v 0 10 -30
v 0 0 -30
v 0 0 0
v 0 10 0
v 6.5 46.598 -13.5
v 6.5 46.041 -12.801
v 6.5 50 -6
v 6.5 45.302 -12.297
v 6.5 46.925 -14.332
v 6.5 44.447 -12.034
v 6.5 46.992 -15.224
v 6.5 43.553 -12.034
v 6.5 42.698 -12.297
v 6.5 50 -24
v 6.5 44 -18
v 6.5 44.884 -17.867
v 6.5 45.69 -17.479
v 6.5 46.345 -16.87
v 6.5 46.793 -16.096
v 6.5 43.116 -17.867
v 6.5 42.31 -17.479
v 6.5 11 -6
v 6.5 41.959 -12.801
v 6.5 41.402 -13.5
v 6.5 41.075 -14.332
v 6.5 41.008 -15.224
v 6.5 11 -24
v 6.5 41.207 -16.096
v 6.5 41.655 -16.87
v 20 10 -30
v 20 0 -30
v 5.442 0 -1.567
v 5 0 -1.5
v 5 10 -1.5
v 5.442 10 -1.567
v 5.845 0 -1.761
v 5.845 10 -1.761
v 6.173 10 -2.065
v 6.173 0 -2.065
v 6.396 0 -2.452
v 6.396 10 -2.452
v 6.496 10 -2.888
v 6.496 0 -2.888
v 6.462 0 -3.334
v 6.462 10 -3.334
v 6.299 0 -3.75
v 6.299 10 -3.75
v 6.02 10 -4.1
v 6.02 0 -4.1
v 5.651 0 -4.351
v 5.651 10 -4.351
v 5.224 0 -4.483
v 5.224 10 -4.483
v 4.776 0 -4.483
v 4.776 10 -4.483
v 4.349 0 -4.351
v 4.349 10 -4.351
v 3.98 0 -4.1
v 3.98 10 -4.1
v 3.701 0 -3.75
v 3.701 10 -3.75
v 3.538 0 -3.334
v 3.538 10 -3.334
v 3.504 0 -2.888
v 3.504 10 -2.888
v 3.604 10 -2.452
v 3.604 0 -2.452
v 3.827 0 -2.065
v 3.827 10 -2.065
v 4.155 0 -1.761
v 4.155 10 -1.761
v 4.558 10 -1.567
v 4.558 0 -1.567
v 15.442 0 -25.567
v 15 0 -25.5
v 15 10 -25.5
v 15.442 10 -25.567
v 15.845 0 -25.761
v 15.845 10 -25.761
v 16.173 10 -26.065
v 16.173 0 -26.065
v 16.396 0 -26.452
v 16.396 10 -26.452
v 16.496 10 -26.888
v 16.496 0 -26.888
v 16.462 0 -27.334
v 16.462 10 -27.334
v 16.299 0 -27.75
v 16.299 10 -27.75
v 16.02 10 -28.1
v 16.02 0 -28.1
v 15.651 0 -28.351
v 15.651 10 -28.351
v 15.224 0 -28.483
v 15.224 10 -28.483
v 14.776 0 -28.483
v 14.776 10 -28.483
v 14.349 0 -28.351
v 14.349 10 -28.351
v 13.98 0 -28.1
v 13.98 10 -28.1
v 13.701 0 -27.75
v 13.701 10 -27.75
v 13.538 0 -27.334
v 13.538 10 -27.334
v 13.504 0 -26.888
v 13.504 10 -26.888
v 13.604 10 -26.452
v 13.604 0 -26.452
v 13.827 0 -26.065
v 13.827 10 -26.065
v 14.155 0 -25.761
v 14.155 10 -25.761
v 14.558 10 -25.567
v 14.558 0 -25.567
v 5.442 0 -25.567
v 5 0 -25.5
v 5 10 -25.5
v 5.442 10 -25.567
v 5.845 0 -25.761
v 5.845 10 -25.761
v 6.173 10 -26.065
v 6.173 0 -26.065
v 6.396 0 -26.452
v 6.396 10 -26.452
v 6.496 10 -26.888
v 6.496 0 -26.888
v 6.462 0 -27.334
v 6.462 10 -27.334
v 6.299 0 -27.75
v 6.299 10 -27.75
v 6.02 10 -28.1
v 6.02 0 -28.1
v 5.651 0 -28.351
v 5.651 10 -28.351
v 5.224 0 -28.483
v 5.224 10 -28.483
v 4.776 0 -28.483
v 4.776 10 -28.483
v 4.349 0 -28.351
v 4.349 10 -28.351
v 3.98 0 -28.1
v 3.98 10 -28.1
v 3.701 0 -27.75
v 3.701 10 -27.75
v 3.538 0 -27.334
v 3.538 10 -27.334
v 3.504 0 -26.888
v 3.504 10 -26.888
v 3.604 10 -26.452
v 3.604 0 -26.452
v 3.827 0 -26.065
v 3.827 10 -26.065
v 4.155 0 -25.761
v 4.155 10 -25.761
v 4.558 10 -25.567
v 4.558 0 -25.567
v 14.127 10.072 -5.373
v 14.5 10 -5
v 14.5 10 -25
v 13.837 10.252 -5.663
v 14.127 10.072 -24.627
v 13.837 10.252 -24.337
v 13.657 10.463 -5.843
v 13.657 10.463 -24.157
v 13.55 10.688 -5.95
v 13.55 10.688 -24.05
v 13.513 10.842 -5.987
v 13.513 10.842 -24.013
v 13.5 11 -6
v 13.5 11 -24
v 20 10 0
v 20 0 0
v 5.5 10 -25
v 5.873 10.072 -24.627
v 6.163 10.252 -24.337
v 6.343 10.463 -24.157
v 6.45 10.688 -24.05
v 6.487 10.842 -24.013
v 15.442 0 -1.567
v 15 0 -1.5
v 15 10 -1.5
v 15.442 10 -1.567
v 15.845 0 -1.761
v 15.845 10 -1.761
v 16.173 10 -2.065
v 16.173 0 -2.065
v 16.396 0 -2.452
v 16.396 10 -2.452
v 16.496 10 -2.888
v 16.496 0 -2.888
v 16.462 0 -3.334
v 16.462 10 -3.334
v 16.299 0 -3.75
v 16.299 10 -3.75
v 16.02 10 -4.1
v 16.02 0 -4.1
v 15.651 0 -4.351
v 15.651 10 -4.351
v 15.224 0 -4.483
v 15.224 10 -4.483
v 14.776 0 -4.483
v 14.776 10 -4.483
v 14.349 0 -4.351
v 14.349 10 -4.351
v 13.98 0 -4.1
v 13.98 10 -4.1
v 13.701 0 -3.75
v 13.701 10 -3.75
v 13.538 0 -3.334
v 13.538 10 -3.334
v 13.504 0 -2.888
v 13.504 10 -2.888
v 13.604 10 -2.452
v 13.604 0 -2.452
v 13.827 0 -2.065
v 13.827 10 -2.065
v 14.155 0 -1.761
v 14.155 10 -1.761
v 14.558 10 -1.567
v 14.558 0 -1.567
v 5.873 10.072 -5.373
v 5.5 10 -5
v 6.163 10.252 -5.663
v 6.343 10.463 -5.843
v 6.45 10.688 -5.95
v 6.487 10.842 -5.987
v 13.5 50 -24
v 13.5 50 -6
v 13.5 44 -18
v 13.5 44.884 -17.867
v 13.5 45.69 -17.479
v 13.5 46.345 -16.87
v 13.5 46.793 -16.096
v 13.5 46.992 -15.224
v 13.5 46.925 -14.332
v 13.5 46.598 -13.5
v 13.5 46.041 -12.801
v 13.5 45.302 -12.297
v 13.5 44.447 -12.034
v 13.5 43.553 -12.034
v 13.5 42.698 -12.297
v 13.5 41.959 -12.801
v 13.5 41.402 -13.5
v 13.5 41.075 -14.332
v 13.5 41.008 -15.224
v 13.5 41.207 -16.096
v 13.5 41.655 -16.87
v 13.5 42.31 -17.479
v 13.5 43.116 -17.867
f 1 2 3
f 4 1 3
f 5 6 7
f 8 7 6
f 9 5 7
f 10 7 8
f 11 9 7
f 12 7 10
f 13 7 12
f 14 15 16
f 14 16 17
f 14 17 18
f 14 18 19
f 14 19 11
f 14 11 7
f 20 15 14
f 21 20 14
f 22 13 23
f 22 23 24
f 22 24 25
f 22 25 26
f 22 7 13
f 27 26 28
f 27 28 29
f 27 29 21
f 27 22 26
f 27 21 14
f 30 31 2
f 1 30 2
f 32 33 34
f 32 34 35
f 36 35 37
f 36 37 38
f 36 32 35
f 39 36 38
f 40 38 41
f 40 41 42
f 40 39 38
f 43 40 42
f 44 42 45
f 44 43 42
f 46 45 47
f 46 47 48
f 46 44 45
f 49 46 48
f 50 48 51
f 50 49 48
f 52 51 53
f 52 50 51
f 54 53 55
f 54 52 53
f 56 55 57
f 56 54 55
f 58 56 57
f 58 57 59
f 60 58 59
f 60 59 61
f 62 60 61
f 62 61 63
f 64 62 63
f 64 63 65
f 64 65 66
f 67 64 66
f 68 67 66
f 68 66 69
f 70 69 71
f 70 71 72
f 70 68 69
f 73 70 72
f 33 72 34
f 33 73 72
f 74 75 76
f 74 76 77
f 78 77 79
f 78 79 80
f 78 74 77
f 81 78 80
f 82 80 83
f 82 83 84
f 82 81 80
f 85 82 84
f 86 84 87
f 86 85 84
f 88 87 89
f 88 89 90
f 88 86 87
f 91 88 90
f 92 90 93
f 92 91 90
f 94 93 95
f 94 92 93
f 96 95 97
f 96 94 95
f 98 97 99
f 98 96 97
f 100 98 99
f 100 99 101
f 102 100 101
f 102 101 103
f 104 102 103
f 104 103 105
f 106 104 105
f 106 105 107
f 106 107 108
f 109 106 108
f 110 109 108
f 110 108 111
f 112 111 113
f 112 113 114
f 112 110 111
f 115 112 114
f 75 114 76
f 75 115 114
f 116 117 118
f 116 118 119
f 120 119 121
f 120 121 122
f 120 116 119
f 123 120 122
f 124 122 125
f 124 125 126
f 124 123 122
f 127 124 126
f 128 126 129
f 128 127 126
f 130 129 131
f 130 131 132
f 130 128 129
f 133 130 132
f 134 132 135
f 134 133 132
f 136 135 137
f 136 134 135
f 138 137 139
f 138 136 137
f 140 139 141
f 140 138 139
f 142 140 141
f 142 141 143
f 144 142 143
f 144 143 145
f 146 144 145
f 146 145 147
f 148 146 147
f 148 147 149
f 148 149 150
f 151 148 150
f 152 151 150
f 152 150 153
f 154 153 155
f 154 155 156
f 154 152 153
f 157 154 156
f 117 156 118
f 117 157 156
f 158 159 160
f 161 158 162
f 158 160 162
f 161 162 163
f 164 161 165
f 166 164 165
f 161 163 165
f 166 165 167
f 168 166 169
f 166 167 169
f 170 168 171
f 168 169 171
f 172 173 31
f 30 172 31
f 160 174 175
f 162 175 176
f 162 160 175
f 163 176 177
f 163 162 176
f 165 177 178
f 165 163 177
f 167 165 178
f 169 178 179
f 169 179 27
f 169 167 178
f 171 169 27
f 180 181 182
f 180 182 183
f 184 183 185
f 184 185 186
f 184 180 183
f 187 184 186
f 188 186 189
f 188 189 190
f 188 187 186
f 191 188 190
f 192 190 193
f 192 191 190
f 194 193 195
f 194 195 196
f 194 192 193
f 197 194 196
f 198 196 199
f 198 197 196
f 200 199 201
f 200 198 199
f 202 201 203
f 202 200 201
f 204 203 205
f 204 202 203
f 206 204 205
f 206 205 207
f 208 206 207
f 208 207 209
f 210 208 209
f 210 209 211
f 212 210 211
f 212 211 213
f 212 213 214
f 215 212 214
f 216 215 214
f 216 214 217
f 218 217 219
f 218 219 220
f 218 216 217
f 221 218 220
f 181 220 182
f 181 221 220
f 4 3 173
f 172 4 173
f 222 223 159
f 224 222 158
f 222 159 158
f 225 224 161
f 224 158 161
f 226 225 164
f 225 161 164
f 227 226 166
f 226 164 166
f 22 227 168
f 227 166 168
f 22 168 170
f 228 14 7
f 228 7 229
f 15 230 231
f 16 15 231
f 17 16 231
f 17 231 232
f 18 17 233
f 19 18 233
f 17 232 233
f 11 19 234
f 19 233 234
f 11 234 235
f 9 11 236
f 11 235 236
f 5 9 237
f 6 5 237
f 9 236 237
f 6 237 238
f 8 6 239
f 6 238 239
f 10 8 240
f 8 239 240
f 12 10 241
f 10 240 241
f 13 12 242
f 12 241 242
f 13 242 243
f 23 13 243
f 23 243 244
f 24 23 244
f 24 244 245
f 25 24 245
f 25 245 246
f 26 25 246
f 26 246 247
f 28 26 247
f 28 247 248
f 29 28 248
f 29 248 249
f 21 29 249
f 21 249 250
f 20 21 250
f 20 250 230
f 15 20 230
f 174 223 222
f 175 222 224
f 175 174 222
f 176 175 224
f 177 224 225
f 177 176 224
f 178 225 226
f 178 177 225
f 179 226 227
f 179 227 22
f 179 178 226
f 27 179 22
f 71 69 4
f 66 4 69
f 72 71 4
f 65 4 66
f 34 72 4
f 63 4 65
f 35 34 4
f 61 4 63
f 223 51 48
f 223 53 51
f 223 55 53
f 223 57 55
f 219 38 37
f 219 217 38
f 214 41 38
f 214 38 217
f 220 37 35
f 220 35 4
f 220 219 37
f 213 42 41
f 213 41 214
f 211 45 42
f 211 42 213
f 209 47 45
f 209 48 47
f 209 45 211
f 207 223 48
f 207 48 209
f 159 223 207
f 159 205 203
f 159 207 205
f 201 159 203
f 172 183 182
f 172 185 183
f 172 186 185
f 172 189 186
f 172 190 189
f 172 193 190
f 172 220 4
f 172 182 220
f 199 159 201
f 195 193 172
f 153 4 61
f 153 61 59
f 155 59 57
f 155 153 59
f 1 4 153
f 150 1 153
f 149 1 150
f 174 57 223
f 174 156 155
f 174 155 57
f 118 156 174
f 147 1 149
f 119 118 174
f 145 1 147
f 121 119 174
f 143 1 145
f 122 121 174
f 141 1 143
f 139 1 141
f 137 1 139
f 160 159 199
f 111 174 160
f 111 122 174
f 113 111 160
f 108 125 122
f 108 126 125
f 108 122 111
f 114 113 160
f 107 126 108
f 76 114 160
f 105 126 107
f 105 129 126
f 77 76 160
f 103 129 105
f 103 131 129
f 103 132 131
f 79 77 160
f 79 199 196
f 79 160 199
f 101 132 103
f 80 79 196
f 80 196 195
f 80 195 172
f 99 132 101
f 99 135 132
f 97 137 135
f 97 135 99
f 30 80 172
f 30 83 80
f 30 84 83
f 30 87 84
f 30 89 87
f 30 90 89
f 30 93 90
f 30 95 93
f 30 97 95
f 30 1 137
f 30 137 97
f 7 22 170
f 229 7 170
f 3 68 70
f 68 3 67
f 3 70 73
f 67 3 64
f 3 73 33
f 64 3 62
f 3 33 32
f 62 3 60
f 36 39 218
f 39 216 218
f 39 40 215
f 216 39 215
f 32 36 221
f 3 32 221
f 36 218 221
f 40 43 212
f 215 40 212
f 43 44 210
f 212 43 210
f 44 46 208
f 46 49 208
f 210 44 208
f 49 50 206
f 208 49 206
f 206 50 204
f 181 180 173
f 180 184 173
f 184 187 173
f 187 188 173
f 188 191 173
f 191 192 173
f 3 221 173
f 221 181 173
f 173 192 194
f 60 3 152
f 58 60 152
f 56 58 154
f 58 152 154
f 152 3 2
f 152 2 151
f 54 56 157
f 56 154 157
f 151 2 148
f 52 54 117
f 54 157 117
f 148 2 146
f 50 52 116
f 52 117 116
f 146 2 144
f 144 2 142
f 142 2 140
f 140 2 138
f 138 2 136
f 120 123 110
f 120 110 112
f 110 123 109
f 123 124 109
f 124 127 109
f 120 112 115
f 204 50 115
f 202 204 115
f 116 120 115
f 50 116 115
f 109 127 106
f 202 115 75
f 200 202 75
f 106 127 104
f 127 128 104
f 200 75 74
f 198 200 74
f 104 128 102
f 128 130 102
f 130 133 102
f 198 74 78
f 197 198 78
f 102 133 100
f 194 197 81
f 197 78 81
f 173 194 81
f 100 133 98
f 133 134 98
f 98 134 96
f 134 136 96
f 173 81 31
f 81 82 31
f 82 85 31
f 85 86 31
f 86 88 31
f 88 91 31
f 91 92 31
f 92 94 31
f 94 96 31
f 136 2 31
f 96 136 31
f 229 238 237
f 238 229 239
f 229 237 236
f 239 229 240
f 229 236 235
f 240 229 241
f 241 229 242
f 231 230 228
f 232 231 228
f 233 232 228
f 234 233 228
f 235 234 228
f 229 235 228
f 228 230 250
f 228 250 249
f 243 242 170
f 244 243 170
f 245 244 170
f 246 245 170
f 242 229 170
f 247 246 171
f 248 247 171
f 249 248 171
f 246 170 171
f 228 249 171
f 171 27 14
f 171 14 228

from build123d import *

# Parameters (mm, degrees)
SKETCH1_R           = 1.5
BOSS_EXTRUDE1_DEPTH = 10
SKETCH2_W           = 7
SKETCH2_H           = 18
BOSS_EXTRUDE2_DEPTH = 40
SKETCH3_R           = 3
CUT_EXTRUDE1_DEPTH  = 40
FILLET1_R           = 1


with BuildPart() as part:
    # Sketch1 → Boss-Extrude1 (new body)
    with BuildSketch(Plane(origin=(0, 0, 0), x_dir=(1, 0, 0), z_dir=(0, 1, 0))):
        Polygon((0, 30), (0, 0), (10, 0), (20, 0), (20, 30), align=None)
        with Locations(Location((5, 3, 0), (0, 0, 270))):
            Circle(SKETCH1_R, mode=Mode.SUBTRACT)
        with Locations(Location((15, 3, 0), (0, 0, 270))):
            Circle(SKETCH1_R, mode=Mode.SUBTRACT)
        with Locations(Location((5, 27, 0), (0, 0, 270))):
            Circle(SKETCH1_R, mode=Mode.SUBTRACT)
        with Locations(Location((15, 27, 0), (0, 0, 270))):
            Circle(SKETCH1_R, mode=Mode.SUBTRACT)
    extrude(amount=BOSS_EXTRUDE1_DEPTH)

    # Sketch2 → Boss-Extrude2 (add)
    with BuildSketch(Plane(origin=(0, 10, 0), x_dir=(1, 0, 0), z_dir=(0, 1, 0))):
        with Locations((10, 15)):
            Rectangle(SKETCH2_W, SKETCH2_H)
    extrude(amount=BOSS_EXTRUDE2_DEPTH)

    # Sketch3 → Cut-Extrude1 (cut)
    with BuildSketch(Plane(origin=(13.5, 0, 0), x_dir=(0, 0, -1), z_dir=(1, 0, 0))):
        with Locations((15, 44)):
            Circle(SKETCH3_R)
    extrude(amount=-CUT_EXTRUDE1_DEPTH, mode=Mode.SUBTRACT)

    # Fillet1
    fillet1_edges = [part.edges().sort_by_distance(p)[0] for p in [
        (13.5, 10, -15),
        (10, 10, -24),
        (6.5, 10, -15),
        (10, 10, -6),
    ]]
    fillet(fillet1_edges, radius=FILLET1_R)


solid = part.part
